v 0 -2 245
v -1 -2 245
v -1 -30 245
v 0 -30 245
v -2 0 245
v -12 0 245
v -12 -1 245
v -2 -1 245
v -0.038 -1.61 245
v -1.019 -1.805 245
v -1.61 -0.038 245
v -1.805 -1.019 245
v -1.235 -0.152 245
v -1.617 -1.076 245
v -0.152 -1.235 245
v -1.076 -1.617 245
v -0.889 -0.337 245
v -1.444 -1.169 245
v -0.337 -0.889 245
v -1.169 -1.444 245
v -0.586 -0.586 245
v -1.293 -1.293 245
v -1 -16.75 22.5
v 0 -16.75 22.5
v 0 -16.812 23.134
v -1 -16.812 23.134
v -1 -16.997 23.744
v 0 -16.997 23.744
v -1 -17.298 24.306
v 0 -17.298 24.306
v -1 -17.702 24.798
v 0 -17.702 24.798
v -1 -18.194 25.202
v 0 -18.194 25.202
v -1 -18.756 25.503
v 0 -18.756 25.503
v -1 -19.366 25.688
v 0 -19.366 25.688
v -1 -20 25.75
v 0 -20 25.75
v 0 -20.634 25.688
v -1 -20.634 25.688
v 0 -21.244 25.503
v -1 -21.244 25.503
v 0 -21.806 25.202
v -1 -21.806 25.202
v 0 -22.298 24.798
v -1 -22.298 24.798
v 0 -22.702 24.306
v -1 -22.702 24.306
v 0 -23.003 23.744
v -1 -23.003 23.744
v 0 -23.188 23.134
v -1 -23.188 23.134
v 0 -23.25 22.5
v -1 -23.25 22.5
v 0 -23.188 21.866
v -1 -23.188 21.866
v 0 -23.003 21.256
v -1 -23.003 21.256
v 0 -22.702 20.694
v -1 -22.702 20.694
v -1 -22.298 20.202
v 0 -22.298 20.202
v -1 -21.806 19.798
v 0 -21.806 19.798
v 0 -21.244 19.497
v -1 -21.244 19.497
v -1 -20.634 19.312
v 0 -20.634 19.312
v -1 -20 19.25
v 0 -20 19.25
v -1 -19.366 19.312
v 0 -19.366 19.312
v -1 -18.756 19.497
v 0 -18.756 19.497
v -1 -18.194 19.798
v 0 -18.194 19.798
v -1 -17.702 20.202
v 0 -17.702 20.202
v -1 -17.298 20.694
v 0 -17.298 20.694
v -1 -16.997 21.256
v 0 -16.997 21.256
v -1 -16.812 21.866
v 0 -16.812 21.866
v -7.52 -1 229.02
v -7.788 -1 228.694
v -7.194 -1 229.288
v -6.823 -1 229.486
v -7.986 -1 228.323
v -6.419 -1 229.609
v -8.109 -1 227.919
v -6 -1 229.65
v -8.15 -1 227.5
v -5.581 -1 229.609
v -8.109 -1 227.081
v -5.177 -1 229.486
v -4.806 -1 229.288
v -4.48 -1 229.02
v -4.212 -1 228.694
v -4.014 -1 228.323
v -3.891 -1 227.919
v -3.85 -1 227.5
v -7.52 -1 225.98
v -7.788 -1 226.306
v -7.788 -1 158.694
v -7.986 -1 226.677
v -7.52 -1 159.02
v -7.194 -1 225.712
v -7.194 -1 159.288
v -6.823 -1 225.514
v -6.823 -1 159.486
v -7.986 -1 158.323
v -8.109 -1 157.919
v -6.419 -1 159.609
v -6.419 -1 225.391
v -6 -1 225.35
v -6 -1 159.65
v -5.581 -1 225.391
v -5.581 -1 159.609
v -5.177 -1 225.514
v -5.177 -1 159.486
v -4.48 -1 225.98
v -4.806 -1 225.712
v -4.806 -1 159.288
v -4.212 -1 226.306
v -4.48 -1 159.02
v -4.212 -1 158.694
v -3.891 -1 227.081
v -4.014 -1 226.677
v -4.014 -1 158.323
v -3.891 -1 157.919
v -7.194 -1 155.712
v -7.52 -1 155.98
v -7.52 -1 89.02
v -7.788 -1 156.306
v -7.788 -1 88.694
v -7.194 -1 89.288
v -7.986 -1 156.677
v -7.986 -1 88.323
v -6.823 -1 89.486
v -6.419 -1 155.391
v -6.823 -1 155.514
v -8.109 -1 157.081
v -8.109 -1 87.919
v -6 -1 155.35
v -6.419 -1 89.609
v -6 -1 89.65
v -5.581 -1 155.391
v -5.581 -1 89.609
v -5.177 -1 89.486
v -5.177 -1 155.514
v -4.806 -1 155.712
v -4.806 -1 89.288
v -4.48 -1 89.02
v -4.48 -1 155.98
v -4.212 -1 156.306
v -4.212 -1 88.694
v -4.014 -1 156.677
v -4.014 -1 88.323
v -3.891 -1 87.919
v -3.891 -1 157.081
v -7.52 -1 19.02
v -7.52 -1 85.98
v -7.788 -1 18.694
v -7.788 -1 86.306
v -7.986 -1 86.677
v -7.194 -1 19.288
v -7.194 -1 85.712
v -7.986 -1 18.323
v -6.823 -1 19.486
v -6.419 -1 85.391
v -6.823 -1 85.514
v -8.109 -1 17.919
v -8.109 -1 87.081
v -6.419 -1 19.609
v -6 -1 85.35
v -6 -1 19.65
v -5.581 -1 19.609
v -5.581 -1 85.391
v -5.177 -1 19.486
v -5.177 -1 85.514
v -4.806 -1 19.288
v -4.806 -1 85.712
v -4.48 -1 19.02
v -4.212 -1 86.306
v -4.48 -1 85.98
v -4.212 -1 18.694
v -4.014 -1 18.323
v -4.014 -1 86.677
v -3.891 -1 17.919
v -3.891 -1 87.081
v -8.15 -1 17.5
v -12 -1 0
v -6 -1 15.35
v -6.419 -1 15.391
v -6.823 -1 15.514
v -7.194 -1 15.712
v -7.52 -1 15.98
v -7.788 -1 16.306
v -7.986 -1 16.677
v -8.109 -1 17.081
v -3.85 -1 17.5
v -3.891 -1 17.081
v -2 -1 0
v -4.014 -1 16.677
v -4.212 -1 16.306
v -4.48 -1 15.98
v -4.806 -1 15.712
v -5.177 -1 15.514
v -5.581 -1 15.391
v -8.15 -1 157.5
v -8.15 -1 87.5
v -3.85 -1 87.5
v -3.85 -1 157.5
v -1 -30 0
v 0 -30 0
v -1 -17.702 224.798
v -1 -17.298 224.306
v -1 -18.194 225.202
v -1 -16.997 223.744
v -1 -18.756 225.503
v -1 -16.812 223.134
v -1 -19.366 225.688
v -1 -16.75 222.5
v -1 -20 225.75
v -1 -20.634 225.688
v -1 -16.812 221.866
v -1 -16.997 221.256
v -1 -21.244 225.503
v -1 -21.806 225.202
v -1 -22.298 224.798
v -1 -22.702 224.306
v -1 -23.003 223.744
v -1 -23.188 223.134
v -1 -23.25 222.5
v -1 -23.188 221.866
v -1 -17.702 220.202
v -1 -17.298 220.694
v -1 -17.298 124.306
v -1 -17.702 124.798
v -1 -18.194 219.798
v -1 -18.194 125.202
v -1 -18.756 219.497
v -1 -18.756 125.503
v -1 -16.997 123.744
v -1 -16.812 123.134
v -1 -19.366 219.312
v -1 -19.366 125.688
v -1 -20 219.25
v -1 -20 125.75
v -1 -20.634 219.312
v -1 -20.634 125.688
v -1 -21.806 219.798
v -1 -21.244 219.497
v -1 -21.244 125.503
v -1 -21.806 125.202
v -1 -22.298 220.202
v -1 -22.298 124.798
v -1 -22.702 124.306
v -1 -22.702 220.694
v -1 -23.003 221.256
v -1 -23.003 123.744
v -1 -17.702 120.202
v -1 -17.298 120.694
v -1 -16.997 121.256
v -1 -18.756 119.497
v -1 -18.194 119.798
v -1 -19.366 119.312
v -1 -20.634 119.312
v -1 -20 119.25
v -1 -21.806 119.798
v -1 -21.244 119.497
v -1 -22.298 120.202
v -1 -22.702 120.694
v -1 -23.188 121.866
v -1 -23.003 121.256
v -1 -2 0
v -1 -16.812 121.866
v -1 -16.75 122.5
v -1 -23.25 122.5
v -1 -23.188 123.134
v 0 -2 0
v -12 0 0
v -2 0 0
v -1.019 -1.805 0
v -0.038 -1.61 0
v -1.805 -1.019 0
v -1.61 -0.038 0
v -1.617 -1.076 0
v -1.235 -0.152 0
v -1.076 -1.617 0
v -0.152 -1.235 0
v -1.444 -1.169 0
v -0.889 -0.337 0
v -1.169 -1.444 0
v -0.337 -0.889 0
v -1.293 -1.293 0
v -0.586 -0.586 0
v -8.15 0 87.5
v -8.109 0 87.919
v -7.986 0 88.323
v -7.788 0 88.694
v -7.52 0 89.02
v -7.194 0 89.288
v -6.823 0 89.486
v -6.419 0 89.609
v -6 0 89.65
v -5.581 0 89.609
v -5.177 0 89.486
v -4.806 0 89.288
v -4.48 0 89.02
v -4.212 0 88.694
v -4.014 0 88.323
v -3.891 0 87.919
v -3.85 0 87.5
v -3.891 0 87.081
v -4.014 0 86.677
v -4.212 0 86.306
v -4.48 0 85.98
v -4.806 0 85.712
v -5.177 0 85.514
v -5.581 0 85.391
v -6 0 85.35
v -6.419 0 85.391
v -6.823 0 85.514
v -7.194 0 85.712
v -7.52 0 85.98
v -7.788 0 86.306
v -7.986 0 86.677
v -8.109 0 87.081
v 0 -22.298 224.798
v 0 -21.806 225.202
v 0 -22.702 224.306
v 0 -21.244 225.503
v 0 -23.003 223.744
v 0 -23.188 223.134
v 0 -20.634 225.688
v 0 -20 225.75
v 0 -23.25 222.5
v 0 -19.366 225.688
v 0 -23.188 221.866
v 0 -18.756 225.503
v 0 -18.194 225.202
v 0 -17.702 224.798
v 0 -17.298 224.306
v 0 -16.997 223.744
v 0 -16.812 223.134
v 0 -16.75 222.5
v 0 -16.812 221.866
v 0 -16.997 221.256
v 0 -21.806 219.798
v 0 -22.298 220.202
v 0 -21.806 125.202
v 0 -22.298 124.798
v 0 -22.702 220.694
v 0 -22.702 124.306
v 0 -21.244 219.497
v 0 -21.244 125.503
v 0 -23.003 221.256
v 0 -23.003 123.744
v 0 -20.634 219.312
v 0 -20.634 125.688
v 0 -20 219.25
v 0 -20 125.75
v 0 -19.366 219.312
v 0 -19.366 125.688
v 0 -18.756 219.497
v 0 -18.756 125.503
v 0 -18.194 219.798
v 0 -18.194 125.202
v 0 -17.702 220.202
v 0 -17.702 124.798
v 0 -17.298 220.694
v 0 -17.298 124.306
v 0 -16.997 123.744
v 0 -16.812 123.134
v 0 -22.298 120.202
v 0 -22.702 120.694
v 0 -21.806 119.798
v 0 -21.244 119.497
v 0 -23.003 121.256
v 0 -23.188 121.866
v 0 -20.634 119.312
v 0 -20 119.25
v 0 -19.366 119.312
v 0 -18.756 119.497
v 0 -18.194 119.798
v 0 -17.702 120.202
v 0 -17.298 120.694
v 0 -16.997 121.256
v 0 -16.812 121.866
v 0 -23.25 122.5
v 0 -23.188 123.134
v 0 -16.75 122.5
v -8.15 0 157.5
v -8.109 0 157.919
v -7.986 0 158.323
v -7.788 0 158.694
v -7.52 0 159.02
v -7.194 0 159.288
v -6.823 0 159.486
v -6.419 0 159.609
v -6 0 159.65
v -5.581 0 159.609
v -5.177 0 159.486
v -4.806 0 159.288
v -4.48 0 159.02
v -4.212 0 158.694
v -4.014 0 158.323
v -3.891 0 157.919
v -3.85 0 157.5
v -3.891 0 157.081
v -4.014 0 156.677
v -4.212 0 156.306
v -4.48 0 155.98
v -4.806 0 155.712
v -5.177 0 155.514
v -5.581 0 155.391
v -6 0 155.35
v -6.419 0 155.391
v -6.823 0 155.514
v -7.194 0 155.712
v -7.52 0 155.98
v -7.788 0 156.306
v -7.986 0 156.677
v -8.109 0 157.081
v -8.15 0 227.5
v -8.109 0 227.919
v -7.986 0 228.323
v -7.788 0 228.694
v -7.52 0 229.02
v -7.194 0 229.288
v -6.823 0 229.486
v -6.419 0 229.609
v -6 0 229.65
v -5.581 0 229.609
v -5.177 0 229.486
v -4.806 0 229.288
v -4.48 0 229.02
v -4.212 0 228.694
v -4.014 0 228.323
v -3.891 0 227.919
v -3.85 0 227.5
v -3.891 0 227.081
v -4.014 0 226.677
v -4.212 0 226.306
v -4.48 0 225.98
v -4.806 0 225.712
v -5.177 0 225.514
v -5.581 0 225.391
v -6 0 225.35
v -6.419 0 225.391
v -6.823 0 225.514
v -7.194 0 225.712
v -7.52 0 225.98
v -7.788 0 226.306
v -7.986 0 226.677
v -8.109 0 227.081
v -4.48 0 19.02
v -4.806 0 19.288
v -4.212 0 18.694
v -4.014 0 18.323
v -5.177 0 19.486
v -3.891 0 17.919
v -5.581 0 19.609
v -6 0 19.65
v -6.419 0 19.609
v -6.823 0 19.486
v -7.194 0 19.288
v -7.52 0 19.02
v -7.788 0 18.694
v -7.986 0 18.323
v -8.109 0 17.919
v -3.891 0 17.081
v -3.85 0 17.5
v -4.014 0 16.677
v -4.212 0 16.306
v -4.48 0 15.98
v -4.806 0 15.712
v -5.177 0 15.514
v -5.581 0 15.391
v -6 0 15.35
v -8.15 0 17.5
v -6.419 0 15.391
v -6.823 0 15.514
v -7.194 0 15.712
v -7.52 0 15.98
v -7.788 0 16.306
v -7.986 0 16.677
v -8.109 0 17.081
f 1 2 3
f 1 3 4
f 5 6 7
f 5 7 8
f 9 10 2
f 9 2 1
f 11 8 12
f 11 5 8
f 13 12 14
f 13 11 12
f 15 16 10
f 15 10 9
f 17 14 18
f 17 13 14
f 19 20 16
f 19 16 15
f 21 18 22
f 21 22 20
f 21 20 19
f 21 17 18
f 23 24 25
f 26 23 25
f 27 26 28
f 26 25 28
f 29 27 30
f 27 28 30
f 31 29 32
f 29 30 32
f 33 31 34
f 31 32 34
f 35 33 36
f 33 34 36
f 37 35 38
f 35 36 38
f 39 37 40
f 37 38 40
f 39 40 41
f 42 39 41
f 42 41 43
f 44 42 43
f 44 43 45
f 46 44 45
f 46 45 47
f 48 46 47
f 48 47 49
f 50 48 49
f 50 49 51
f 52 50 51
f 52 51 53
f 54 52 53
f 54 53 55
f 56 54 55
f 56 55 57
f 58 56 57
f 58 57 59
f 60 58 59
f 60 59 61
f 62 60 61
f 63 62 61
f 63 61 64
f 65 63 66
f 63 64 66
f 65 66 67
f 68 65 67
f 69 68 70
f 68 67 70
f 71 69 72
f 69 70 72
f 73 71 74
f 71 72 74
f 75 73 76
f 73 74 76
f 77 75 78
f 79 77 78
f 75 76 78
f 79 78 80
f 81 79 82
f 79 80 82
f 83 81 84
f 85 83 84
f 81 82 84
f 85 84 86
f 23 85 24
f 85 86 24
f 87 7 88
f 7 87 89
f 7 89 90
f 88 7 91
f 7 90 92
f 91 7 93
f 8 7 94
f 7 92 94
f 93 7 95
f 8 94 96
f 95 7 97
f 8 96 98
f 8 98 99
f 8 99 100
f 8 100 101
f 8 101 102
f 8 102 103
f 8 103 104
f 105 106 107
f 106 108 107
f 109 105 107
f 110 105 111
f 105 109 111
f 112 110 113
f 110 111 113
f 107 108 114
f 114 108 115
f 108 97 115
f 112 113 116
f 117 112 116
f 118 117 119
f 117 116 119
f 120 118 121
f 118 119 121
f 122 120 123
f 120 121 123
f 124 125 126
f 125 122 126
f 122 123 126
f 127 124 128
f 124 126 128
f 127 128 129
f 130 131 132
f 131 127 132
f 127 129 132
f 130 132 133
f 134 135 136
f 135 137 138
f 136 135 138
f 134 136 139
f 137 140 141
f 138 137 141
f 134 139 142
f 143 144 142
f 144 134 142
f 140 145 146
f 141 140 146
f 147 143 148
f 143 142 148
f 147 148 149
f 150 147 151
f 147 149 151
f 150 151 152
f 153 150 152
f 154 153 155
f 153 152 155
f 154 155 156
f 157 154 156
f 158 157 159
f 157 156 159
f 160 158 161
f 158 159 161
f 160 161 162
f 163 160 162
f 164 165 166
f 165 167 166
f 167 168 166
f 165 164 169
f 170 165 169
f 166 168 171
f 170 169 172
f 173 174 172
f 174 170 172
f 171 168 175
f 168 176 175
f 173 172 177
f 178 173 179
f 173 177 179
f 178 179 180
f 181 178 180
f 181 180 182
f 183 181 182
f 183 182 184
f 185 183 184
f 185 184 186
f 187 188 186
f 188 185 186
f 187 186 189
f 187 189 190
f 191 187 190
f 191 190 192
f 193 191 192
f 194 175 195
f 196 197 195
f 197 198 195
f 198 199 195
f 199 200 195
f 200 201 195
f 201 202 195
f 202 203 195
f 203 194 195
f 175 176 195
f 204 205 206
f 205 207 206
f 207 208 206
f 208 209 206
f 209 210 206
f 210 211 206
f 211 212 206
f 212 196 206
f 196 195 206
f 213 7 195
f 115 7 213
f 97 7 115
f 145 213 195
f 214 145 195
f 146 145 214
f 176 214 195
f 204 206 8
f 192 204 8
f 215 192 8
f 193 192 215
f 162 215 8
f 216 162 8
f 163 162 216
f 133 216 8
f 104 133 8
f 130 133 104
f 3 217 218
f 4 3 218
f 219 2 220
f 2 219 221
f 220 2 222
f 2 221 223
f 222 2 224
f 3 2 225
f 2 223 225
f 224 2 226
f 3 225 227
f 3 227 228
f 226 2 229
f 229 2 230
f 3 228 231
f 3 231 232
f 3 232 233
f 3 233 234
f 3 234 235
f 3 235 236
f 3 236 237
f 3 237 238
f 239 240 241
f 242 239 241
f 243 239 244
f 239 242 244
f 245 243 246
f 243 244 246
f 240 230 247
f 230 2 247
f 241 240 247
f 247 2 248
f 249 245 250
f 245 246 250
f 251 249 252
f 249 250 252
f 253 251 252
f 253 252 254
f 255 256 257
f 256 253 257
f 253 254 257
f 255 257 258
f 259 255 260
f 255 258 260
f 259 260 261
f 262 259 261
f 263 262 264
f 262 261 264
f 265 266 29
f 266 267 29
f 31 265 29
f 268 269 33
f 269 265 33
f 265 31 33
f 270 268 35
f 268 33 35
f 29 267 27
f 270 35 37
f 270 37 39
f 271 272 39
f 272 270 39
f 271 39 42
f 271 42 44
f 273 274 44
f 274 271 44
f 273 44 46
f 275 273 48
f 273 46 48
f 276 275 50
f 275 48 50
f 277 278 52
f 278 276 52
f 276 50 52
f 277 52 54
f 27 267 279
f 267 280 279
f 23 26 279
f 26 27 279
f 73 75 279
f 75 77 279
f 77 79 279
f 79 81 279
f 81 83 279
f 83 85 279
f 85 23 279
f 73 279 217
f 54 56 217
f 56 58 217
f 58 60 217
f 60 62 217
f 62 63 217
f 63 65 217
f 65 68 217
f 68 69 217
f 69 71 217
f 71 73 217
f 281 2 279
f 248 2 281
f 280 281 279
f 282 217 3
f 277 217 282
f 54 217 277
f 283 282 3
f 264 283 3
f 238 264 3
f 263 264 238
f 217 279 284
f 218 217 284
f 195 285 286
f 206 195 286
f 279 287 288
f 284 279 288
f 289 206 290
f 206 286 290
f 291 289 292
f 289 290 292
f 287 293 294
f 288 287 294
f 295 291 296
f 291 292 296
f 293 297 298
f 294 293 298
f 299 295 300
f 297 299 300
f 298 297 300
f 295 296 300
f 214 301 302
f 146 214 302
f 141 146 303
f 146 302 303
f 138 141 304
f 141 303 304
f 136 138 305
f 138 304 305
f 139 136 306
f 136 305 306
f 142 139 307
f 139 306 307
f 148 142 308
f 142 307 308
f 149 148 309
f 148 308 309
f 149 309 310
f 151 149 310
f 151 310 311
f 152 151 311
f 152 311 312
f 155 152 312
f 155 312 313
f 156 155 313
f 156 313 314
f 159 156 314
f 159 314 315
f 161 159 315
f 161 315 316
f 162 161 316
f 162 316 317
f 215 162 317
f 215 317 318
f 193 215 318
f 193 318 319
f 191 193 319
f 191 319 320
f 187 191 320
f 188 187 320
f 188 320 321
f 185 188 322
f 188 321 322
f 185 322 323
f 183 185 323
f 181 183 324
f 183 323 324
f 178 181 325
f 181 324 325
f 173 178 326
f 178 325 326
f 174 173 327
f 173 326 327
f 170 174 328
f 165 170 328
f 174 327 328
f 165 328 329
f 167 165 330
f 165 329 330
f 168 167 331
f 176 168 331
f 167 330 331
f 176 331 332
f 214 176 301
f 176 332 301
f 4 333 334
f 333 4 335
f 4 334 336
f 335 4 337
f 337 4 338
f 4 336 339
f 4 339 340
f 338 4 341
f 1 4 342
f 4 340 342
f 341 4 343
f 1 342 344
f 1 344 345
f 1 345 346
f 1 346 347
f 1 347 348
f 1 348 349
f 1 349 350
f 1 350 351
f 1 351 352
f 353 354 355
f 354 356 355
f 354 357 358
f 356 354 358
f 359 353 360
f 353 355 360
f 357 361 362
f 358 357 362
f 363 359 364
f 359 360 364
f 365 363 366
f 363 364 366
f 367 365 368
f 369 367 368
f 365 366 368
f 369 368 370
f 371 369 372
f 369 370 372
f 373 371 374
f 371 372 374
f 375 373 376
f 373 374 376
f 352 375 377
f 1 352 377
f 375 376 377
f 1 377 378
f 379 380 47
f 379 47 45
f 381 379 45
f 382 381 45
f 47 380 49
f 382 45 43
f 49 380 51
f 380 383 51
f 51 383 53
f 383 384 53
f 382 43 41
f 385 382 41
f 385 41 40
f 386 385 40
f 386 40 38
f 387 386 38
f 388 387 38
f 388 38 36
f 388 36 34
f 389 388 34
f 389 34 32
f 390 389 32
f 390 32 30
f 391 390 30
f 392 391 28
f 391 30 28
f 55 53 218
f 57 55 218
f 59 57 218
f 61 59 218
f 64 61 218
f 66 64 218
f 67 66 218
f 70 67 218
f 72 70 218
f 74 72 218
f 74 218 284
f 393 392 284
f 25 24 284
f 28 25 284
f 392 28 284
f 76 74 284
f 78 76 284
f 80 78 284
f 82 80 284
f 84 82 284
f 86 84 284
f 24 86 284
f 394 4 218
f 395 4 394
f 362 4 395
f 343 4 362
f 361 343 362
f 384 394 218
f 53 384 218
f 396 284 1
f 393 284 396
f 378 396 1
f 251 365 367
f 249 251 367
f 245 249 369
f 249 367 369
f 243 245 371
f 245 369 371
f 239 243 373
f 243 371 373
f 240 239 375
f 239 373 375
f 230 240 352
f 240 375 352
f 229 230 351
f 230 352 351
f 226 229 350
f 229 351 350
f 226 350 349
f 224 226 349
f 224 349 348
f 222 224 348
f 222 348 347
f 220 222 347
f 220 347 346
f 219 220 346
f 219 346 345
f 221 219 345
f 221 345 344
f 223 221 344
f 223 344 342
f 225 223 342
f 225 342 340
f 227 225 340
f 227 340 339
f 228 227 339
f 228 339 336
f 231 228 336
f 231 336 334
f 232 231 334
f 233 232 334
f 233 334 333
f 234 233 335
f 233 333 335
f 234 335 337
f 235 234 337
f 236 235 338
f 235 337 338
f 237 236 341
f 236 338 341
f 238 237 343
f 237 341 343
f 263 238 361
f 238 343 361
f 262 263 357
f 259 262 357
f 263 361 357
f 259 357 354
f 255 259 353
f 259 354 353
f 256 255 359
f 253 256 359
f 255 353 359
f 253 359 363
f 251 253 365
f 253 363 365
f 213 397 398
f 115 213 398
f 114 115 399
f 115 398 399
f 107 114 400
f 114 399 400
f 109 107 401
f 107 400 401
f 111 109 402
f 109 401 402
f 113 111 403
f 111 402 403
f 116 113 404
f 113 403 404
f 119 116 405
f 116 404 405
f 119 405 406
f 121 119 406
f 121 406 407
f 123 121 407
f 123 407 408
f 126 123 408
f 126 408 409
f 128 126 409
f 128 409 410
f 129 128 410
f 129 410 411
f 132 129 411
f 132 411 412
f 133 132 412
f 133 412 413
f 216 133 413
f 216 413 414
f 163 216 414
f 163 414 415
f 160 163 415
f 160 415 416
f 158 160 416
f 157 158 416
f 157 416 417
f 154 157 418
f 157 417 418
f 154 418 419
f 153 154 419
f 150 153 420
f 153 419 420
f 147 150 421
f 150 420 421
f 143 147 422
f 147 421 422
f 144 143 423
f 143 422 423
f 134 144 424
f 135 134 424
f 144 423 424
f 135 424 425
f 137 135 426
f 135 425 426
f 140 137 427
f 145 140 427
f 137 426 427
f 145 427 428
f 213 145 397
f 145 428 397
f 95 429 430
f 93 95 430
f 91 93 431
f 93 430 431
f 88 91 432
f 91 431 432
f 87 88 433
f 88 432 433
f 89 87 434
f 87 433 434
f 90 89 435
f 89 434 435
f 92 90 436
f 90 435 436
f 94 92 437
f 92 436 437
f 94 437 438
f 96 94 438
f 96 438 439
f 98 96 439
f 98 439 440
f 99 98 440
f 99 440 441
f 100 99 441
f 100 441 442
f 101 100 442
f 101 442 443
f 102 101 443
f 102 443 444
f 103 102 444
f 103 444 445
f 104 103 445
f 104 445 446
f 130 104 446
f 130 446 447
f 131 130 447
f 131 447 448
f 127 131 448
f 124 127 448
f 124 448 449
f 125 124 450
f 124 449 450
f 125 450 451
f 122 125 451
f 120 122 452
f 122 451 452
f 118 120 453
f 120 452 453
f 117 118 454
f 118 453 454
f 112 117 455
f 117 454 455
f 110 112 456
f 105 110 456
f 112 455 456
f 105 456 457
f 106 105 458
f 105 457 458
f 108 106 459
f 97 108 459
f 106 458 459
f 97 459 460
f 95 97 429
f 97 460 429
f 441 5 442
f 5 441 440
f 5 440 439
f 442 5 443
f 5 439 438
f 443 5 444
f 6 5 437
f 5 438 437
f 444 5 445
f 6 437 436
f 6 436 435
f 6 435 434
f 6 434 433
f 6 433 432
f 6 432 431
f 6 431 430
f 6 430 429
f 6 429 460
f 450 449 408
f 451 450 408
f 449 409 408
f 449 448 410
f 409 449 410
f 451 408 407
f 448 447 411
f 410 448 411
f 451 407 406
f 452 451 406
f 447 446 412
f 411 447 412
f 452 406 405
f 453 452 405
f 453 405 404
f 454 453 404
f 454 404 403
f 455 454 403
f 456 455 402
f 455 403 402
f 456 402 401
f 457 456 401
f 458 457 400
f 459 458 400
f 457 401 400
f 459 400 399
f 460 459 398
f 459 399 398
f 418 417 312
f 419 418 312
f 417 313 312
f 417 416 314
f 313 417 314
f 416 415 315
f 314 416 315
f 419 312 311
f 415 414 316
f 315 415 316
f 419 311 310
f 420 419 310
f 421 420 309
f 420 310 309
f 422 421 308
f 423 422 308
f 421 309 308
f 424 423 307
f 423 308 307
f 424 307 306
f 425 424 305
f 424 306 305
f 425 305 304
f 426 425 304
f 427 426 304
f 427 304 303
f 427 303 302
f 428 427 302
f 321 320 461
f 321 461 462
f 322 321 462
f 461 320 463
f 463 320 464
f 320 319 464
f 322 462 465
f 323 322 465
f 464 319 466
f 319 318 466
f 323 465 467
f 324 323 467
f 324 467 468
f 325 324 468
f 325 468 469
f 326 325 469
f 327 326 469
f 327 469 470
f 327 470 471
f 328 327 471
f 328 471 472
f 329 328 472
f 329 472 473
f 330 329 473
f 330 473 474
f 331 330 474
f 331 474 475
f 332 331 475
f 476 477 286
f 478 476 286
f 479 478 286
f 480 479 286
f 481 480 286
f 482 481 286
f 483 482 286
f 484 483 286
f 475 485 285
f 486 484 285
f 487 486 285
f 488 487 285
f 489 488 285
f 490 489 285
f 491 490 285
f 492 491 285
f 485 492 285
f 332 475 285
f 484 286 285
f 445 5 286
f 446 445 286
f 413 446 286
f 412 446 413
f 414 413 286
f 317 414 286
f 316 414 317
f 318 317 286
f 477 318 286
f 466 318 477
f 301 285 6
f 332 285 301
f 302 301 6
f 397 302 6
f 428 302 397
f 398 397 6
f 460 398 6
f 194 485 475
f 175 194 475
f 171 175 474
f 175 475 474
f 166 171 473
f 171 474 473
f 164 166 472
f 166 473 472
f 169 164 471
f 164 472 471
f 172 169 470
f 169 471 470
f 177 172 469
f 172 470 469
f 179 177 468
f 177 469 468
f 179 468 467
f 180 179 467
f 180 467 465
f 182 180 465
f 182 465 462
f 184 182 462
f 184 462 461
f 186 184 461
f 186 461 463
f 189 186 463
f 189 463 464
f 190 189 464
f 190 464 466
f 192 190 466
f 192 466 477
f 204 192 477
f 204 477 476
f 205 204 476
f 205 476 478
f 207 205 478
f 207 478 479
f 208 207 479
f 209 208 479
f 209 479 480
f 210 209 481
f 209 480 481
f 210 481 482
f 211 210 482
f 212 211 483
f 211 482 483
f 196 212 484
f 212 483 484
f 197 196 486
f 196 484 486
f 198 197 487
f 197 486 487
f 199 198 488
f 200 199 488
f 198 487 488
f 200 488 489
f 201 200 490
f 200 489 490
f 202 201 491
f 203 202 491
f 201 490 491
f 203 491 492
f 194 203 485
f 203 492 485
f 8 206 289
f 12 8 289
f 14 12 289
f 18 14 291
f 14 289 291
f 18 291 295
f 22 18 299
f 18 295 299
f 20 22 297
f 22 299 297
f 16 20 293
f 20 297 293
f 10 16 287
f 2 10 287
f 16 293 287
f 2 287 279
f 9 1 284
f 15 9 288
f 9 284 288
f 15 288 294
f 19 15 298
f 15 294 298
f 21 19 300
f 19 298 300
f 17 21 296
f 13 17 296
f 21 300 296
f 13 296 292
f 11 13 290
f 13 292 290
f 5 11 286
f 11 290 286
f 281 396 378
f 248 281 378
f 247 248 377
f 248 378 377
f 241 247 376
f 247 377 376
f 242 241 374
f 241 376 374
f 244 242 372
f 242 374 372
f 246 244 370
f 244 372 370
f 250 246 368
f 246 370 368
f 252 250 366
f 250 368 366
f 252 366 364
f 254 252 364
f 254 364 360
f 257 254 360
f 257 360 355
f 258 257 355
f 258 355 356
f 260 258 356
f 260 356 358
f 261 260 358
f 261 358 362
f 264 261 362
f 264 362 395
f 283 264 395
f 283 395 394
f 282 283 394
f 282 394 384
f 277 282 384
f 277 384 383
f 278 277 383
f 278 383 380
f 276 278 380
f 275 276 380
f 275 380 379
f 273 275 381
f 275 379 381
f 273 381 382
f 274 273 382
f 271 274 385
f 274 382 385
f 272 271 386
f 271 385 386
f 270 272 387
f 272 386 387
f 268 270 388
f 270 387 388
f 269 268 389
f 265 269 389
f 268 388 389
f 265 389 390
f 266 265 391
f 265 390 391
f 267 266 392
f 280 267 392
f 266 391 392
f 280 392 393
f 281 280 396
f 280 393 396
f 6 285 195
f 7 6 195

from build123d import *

# Parameters (mm, degrees)
EXTRUDE_1_DEPTH     = 245
SKETCH_2_R          = 2.15
CUT_EXTRUDE_1_DEPTH = 245
SKETCH_3_R          = 3.25
CUT_EXTRUDE_2_DEPTH = 245


with BuildPart() as part:
    # Эскиз1 → Вытянуть1 (new body)
    with BuildSketch(Plane.XY):
        with BuildLine():
            Line((-1, -2), (-1, -30))
            Line((-1, -30), (0, -30))
            Line((0, -30), (0, -2))
            ThreePointArc((0, -2), (-0.585786438, -0.585786438), (-2, 0))
            Line((-2, 0), (-12, 0))
            Line((-12, 0), (-12, -1))
            Line((-12, -1), (-2, -1))
            ThreePointArc((-2, -1), (-1.292893219, -1.292893219), (-1, -2))
        make_face()
    extrude(amount=EXTRUDE_1_DEPTH)

    # Эскиз2 → Вырез-Вытянуть1 (cut)
    with BuildSketch(Plane(origin=(0, 0, 0), x_dir=(1, 0, 0), z_dir=(0, 1, 0))):
        with Locations(Location((-6, -17.5, 0), (0, 0, 180))):
            Circle(SKETCH_2_R)
        with Locations(Location((-6, -87.5, 0), (0, 0, 180))):
            Circle(SKETCH_2_R)
        with Locations(Location((-6, -157.5, 0), (0, 0, 180))):
            Circle(SKETCH_2_R)
        with Locations(Location((-6, -227.5, 0), (0, 0, 180))):
            Circle(SKETCH_2_R)
    extrude(amount=-CUT_EXTRUDE_1_DEPTH, mode=Mode.SUBTRACT)

    # Эскиз3 → Вырез-Вытянуть2 (cut)
    with BuildSketch(Plane(origin=(0, 0, 0), x_dir=(0, 0, -1), z_dir=(1, 0, 0))):
        with Locations(Location((-122.5, -20, 0), (0, 0, 90))):
            Circle(SKETCH_3_R)
        with Locations(Location((-22.5, -20, 0), (0, 0, 90))):
            Circle(SKETCH_3_R)
        with Locations((-222.5, -20)):
            Circle(SKETCH_3_R)
    extrude(amount=-CUT_EXTRUDE_2_DEPTH, mode=Mode.SUBTRACT)


solid = part.part
